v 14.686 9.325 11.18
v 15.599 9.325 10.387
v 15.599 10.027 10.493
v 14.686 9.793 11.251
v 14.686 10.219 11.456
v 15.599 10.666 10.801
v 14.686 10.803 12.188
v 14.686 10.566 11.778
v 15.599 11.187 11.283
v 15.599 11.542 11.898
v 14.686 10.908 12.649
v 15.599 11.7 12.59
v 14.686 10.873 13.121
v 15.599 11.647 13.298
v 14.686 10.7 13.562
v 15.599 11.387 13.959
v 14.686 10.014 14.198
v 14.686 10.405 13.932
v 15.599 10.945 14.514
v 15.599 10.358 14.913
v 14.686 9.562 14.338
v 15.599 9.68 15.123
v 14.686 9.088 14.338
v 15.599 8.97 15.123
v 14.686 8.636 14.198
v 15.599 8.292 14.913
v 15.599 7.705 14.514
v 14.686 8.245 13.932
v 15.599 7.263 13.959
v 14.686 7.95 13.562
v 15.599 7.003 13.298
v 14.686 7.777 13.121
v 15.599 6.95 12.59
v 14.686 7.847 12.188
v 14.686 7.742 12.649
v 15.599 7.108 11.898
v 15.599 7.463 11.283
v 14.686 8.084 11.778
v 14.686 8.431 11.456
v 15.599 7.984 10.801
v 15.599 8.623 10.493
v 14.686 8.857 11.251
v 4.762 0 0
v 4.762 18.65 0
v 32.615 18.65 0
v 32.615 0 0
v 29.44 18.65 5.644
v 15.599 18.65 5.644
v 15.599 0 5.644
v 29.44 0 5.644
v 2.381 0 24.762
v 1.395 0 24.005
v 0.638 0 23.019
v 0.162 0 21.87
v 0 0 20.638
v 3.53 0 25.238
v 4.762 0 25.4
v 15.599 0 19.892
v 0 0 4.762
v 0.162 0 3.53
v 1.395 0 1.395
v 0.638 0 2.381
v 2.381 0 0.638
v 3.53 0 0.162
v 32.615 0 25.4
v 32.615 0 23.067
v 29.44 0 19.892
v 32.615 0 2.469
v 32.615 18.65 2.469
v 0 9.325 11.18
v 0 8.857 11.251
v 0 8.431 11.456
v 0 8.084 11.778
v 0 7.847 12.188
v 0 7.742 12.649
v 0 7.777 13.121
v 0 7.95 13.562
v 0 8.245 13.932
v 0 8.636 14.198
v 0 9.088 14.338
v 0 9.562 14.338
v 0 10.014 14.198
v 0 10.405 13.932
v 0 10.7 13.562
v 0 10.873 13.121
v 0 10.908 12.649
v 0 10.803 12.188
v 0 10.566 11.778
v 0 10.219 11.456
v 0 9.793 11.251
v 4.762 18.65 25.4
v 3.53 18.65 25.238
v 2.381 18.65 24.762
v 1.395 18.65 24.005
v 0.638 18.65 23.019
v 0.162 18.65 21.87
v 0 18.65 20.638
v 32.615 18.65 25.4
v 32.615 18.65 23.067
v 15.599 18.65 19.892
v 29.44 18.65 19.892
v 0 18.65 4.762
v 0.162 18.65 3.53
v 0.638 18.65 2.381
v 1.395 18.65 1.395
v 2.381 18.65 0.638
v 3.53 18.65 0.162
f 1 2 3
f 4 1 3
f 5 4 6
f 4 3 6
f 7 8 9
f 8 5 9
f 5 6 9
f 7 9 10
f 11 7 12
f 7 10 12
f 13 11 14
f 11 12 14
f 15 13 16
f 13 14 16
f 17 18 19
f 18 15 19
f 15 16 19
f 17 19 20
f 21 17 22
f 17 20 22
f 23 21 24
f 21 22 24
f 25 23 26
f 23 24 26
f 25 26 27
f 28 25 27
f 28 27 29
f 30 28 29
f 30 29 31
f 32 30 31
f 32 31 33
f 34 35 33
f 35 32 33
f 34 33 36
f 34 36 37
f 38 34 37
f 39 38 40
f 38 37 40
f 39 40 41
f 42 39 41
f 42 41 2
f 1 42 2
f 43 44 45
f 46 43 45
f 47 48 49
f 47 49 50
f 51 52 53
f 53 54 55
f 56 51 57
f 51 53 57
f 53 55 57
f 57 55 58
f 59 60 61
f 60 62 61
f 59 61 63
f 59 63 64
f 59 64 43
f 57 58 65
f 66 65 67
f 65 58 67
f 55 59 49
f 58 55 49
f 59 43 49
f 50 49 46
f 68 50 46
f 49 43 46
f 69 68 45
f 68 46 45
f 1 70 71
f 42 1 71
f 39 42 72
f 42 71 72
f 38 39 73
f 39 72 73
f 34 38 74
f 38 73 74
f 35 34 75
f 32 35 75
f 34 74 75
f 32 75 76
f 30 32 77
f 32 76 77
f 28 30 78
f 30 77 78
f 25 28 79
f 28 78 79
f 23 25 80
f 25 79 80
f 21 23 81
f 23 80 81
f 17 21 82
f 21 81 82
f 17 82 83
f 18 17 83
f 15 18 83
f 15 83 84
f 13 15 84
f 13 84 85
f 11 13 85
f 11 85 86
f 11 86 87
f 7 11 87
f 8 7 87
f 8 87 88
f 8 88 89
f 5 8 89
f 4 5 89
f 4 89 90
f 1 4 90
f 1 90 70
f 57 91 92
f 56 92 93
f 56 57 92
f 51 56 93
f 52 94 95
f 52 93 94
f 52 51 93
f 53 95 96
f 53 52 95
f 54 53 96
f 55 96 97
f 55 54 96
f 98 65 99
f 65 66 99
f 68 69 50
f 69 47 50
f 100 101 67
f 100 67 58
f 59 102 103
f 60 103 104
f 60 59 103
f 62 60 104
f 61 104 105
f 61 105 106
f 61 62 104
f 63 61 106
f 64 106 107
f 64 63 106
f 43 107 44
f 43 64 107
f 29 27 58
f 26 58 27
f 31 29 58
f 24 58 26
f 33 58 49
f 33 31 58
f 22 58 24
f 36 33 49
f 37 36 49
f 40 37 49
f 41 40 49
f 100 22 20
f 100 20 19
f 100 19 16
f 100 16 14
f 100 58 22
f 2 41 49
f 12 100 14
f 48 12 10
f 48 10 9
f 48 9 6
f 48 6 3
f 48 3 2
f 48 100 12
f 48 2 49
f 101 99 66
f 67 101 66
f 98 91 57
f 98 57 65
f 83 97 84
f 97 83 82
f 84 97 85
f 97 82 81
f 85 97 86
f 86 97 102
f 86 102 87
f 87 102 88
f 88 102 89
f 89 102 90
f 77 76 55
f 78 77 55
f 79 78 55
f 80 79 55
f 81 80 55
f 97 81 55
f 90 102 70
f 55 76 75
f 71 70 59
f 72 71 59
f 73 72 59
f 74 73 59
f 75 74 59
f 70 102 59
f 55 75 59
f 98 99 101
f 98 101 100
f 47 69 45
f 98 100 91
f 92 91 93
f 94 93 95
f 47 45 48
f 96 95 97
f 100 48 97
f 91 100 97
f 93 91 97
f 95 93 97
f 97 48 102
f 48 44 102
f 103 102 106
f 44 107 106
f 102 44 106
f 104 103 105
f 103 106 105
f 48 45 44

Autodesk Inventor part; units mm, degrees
ref_plane "YZ Plane" through (0, 0, 0) normal (1, 0, 0) x (0, 1, 0)
ref_plane "XZ Plane" through (0, 0, 0) normal (0, 1, 0) x (-1, 0, 0)
ref_plane "XY Plane" through (0, 0, 0) normal (0, 0, 1) x (1, 0, 0)
sketch "Sketch1" plane through (0, 0, 0) normal (0, 0, 1) x (1, 0, 0)
  line L0 (0, 0) -> (32.6151, 0)
  line L1 (32.6151, 0) -> (32.6151, 18.65)
  line L2 (32.6151, 18.65) -> (0, 18.65)
  line L3 (0, 18.65) -> (0, 0)
extrude "Extrusion1" add sketch "Sketch1" along normal blind 25.4
sketch "Sketch2" plane through (0, 18.65, 0) normal (0, 1, 0) x (1, 0, 0)
  line L0 (32.6151, 0) -> (32.6151, -25.4) projected
  line L1 (32.6151, -19.8922) -> (15.5994, -19.8922)
  line L2 (15.5994, -19.8922) -> (15.5994, -5.6439)
  line L3 (15.5994, -5.6439) -> (32.6151, -5.6439)
  line L4 (32.6151, -5.6439) -> (32.6151, -19.8922)
  line L5 (15.5994, -5.6439) -> (15.5994, -0.1361) construction
  line L6 (32.6151, -25.4) -> (0, -25.4) projected
  line L7 (15.5994, -25.4) -> (15.5994, -19.8922) construction
  point P0 (0, 0)
extrude "Extrusion2" cut sketch "Sketch2" against normal through all
fillet "Fillet1" radius 4.7625 2 edges at (0, 9.325, 25.4) (0, 9.325, 0)
chamfer "Chamfer1" distance 3.175 angle 45 2 edges at (32.6151, 9.325, 19.8922) (32.6151, 9.325, 5.6439)
sketch "Sketch3" plane through (15.5994, 18.65, 19.8922) normal (1, 0, 0) x (0, 0, -1)
  line L0 (14.2482, 0) -> (14.2482, -18.65) projected
  line L1 (14.2482, -18.65) -> (0, 0) construction
  point P0 (19.8922, -18.65)
  point P1 (7.1241, -9.325)
hole "Hole1" at (15.5994, 9.325, 12.768) direction (-1, 0, 0) diameter 3.175 end through all countersink diameter 4.7625 countersink angle 82
properties part number "Part feature intro"
